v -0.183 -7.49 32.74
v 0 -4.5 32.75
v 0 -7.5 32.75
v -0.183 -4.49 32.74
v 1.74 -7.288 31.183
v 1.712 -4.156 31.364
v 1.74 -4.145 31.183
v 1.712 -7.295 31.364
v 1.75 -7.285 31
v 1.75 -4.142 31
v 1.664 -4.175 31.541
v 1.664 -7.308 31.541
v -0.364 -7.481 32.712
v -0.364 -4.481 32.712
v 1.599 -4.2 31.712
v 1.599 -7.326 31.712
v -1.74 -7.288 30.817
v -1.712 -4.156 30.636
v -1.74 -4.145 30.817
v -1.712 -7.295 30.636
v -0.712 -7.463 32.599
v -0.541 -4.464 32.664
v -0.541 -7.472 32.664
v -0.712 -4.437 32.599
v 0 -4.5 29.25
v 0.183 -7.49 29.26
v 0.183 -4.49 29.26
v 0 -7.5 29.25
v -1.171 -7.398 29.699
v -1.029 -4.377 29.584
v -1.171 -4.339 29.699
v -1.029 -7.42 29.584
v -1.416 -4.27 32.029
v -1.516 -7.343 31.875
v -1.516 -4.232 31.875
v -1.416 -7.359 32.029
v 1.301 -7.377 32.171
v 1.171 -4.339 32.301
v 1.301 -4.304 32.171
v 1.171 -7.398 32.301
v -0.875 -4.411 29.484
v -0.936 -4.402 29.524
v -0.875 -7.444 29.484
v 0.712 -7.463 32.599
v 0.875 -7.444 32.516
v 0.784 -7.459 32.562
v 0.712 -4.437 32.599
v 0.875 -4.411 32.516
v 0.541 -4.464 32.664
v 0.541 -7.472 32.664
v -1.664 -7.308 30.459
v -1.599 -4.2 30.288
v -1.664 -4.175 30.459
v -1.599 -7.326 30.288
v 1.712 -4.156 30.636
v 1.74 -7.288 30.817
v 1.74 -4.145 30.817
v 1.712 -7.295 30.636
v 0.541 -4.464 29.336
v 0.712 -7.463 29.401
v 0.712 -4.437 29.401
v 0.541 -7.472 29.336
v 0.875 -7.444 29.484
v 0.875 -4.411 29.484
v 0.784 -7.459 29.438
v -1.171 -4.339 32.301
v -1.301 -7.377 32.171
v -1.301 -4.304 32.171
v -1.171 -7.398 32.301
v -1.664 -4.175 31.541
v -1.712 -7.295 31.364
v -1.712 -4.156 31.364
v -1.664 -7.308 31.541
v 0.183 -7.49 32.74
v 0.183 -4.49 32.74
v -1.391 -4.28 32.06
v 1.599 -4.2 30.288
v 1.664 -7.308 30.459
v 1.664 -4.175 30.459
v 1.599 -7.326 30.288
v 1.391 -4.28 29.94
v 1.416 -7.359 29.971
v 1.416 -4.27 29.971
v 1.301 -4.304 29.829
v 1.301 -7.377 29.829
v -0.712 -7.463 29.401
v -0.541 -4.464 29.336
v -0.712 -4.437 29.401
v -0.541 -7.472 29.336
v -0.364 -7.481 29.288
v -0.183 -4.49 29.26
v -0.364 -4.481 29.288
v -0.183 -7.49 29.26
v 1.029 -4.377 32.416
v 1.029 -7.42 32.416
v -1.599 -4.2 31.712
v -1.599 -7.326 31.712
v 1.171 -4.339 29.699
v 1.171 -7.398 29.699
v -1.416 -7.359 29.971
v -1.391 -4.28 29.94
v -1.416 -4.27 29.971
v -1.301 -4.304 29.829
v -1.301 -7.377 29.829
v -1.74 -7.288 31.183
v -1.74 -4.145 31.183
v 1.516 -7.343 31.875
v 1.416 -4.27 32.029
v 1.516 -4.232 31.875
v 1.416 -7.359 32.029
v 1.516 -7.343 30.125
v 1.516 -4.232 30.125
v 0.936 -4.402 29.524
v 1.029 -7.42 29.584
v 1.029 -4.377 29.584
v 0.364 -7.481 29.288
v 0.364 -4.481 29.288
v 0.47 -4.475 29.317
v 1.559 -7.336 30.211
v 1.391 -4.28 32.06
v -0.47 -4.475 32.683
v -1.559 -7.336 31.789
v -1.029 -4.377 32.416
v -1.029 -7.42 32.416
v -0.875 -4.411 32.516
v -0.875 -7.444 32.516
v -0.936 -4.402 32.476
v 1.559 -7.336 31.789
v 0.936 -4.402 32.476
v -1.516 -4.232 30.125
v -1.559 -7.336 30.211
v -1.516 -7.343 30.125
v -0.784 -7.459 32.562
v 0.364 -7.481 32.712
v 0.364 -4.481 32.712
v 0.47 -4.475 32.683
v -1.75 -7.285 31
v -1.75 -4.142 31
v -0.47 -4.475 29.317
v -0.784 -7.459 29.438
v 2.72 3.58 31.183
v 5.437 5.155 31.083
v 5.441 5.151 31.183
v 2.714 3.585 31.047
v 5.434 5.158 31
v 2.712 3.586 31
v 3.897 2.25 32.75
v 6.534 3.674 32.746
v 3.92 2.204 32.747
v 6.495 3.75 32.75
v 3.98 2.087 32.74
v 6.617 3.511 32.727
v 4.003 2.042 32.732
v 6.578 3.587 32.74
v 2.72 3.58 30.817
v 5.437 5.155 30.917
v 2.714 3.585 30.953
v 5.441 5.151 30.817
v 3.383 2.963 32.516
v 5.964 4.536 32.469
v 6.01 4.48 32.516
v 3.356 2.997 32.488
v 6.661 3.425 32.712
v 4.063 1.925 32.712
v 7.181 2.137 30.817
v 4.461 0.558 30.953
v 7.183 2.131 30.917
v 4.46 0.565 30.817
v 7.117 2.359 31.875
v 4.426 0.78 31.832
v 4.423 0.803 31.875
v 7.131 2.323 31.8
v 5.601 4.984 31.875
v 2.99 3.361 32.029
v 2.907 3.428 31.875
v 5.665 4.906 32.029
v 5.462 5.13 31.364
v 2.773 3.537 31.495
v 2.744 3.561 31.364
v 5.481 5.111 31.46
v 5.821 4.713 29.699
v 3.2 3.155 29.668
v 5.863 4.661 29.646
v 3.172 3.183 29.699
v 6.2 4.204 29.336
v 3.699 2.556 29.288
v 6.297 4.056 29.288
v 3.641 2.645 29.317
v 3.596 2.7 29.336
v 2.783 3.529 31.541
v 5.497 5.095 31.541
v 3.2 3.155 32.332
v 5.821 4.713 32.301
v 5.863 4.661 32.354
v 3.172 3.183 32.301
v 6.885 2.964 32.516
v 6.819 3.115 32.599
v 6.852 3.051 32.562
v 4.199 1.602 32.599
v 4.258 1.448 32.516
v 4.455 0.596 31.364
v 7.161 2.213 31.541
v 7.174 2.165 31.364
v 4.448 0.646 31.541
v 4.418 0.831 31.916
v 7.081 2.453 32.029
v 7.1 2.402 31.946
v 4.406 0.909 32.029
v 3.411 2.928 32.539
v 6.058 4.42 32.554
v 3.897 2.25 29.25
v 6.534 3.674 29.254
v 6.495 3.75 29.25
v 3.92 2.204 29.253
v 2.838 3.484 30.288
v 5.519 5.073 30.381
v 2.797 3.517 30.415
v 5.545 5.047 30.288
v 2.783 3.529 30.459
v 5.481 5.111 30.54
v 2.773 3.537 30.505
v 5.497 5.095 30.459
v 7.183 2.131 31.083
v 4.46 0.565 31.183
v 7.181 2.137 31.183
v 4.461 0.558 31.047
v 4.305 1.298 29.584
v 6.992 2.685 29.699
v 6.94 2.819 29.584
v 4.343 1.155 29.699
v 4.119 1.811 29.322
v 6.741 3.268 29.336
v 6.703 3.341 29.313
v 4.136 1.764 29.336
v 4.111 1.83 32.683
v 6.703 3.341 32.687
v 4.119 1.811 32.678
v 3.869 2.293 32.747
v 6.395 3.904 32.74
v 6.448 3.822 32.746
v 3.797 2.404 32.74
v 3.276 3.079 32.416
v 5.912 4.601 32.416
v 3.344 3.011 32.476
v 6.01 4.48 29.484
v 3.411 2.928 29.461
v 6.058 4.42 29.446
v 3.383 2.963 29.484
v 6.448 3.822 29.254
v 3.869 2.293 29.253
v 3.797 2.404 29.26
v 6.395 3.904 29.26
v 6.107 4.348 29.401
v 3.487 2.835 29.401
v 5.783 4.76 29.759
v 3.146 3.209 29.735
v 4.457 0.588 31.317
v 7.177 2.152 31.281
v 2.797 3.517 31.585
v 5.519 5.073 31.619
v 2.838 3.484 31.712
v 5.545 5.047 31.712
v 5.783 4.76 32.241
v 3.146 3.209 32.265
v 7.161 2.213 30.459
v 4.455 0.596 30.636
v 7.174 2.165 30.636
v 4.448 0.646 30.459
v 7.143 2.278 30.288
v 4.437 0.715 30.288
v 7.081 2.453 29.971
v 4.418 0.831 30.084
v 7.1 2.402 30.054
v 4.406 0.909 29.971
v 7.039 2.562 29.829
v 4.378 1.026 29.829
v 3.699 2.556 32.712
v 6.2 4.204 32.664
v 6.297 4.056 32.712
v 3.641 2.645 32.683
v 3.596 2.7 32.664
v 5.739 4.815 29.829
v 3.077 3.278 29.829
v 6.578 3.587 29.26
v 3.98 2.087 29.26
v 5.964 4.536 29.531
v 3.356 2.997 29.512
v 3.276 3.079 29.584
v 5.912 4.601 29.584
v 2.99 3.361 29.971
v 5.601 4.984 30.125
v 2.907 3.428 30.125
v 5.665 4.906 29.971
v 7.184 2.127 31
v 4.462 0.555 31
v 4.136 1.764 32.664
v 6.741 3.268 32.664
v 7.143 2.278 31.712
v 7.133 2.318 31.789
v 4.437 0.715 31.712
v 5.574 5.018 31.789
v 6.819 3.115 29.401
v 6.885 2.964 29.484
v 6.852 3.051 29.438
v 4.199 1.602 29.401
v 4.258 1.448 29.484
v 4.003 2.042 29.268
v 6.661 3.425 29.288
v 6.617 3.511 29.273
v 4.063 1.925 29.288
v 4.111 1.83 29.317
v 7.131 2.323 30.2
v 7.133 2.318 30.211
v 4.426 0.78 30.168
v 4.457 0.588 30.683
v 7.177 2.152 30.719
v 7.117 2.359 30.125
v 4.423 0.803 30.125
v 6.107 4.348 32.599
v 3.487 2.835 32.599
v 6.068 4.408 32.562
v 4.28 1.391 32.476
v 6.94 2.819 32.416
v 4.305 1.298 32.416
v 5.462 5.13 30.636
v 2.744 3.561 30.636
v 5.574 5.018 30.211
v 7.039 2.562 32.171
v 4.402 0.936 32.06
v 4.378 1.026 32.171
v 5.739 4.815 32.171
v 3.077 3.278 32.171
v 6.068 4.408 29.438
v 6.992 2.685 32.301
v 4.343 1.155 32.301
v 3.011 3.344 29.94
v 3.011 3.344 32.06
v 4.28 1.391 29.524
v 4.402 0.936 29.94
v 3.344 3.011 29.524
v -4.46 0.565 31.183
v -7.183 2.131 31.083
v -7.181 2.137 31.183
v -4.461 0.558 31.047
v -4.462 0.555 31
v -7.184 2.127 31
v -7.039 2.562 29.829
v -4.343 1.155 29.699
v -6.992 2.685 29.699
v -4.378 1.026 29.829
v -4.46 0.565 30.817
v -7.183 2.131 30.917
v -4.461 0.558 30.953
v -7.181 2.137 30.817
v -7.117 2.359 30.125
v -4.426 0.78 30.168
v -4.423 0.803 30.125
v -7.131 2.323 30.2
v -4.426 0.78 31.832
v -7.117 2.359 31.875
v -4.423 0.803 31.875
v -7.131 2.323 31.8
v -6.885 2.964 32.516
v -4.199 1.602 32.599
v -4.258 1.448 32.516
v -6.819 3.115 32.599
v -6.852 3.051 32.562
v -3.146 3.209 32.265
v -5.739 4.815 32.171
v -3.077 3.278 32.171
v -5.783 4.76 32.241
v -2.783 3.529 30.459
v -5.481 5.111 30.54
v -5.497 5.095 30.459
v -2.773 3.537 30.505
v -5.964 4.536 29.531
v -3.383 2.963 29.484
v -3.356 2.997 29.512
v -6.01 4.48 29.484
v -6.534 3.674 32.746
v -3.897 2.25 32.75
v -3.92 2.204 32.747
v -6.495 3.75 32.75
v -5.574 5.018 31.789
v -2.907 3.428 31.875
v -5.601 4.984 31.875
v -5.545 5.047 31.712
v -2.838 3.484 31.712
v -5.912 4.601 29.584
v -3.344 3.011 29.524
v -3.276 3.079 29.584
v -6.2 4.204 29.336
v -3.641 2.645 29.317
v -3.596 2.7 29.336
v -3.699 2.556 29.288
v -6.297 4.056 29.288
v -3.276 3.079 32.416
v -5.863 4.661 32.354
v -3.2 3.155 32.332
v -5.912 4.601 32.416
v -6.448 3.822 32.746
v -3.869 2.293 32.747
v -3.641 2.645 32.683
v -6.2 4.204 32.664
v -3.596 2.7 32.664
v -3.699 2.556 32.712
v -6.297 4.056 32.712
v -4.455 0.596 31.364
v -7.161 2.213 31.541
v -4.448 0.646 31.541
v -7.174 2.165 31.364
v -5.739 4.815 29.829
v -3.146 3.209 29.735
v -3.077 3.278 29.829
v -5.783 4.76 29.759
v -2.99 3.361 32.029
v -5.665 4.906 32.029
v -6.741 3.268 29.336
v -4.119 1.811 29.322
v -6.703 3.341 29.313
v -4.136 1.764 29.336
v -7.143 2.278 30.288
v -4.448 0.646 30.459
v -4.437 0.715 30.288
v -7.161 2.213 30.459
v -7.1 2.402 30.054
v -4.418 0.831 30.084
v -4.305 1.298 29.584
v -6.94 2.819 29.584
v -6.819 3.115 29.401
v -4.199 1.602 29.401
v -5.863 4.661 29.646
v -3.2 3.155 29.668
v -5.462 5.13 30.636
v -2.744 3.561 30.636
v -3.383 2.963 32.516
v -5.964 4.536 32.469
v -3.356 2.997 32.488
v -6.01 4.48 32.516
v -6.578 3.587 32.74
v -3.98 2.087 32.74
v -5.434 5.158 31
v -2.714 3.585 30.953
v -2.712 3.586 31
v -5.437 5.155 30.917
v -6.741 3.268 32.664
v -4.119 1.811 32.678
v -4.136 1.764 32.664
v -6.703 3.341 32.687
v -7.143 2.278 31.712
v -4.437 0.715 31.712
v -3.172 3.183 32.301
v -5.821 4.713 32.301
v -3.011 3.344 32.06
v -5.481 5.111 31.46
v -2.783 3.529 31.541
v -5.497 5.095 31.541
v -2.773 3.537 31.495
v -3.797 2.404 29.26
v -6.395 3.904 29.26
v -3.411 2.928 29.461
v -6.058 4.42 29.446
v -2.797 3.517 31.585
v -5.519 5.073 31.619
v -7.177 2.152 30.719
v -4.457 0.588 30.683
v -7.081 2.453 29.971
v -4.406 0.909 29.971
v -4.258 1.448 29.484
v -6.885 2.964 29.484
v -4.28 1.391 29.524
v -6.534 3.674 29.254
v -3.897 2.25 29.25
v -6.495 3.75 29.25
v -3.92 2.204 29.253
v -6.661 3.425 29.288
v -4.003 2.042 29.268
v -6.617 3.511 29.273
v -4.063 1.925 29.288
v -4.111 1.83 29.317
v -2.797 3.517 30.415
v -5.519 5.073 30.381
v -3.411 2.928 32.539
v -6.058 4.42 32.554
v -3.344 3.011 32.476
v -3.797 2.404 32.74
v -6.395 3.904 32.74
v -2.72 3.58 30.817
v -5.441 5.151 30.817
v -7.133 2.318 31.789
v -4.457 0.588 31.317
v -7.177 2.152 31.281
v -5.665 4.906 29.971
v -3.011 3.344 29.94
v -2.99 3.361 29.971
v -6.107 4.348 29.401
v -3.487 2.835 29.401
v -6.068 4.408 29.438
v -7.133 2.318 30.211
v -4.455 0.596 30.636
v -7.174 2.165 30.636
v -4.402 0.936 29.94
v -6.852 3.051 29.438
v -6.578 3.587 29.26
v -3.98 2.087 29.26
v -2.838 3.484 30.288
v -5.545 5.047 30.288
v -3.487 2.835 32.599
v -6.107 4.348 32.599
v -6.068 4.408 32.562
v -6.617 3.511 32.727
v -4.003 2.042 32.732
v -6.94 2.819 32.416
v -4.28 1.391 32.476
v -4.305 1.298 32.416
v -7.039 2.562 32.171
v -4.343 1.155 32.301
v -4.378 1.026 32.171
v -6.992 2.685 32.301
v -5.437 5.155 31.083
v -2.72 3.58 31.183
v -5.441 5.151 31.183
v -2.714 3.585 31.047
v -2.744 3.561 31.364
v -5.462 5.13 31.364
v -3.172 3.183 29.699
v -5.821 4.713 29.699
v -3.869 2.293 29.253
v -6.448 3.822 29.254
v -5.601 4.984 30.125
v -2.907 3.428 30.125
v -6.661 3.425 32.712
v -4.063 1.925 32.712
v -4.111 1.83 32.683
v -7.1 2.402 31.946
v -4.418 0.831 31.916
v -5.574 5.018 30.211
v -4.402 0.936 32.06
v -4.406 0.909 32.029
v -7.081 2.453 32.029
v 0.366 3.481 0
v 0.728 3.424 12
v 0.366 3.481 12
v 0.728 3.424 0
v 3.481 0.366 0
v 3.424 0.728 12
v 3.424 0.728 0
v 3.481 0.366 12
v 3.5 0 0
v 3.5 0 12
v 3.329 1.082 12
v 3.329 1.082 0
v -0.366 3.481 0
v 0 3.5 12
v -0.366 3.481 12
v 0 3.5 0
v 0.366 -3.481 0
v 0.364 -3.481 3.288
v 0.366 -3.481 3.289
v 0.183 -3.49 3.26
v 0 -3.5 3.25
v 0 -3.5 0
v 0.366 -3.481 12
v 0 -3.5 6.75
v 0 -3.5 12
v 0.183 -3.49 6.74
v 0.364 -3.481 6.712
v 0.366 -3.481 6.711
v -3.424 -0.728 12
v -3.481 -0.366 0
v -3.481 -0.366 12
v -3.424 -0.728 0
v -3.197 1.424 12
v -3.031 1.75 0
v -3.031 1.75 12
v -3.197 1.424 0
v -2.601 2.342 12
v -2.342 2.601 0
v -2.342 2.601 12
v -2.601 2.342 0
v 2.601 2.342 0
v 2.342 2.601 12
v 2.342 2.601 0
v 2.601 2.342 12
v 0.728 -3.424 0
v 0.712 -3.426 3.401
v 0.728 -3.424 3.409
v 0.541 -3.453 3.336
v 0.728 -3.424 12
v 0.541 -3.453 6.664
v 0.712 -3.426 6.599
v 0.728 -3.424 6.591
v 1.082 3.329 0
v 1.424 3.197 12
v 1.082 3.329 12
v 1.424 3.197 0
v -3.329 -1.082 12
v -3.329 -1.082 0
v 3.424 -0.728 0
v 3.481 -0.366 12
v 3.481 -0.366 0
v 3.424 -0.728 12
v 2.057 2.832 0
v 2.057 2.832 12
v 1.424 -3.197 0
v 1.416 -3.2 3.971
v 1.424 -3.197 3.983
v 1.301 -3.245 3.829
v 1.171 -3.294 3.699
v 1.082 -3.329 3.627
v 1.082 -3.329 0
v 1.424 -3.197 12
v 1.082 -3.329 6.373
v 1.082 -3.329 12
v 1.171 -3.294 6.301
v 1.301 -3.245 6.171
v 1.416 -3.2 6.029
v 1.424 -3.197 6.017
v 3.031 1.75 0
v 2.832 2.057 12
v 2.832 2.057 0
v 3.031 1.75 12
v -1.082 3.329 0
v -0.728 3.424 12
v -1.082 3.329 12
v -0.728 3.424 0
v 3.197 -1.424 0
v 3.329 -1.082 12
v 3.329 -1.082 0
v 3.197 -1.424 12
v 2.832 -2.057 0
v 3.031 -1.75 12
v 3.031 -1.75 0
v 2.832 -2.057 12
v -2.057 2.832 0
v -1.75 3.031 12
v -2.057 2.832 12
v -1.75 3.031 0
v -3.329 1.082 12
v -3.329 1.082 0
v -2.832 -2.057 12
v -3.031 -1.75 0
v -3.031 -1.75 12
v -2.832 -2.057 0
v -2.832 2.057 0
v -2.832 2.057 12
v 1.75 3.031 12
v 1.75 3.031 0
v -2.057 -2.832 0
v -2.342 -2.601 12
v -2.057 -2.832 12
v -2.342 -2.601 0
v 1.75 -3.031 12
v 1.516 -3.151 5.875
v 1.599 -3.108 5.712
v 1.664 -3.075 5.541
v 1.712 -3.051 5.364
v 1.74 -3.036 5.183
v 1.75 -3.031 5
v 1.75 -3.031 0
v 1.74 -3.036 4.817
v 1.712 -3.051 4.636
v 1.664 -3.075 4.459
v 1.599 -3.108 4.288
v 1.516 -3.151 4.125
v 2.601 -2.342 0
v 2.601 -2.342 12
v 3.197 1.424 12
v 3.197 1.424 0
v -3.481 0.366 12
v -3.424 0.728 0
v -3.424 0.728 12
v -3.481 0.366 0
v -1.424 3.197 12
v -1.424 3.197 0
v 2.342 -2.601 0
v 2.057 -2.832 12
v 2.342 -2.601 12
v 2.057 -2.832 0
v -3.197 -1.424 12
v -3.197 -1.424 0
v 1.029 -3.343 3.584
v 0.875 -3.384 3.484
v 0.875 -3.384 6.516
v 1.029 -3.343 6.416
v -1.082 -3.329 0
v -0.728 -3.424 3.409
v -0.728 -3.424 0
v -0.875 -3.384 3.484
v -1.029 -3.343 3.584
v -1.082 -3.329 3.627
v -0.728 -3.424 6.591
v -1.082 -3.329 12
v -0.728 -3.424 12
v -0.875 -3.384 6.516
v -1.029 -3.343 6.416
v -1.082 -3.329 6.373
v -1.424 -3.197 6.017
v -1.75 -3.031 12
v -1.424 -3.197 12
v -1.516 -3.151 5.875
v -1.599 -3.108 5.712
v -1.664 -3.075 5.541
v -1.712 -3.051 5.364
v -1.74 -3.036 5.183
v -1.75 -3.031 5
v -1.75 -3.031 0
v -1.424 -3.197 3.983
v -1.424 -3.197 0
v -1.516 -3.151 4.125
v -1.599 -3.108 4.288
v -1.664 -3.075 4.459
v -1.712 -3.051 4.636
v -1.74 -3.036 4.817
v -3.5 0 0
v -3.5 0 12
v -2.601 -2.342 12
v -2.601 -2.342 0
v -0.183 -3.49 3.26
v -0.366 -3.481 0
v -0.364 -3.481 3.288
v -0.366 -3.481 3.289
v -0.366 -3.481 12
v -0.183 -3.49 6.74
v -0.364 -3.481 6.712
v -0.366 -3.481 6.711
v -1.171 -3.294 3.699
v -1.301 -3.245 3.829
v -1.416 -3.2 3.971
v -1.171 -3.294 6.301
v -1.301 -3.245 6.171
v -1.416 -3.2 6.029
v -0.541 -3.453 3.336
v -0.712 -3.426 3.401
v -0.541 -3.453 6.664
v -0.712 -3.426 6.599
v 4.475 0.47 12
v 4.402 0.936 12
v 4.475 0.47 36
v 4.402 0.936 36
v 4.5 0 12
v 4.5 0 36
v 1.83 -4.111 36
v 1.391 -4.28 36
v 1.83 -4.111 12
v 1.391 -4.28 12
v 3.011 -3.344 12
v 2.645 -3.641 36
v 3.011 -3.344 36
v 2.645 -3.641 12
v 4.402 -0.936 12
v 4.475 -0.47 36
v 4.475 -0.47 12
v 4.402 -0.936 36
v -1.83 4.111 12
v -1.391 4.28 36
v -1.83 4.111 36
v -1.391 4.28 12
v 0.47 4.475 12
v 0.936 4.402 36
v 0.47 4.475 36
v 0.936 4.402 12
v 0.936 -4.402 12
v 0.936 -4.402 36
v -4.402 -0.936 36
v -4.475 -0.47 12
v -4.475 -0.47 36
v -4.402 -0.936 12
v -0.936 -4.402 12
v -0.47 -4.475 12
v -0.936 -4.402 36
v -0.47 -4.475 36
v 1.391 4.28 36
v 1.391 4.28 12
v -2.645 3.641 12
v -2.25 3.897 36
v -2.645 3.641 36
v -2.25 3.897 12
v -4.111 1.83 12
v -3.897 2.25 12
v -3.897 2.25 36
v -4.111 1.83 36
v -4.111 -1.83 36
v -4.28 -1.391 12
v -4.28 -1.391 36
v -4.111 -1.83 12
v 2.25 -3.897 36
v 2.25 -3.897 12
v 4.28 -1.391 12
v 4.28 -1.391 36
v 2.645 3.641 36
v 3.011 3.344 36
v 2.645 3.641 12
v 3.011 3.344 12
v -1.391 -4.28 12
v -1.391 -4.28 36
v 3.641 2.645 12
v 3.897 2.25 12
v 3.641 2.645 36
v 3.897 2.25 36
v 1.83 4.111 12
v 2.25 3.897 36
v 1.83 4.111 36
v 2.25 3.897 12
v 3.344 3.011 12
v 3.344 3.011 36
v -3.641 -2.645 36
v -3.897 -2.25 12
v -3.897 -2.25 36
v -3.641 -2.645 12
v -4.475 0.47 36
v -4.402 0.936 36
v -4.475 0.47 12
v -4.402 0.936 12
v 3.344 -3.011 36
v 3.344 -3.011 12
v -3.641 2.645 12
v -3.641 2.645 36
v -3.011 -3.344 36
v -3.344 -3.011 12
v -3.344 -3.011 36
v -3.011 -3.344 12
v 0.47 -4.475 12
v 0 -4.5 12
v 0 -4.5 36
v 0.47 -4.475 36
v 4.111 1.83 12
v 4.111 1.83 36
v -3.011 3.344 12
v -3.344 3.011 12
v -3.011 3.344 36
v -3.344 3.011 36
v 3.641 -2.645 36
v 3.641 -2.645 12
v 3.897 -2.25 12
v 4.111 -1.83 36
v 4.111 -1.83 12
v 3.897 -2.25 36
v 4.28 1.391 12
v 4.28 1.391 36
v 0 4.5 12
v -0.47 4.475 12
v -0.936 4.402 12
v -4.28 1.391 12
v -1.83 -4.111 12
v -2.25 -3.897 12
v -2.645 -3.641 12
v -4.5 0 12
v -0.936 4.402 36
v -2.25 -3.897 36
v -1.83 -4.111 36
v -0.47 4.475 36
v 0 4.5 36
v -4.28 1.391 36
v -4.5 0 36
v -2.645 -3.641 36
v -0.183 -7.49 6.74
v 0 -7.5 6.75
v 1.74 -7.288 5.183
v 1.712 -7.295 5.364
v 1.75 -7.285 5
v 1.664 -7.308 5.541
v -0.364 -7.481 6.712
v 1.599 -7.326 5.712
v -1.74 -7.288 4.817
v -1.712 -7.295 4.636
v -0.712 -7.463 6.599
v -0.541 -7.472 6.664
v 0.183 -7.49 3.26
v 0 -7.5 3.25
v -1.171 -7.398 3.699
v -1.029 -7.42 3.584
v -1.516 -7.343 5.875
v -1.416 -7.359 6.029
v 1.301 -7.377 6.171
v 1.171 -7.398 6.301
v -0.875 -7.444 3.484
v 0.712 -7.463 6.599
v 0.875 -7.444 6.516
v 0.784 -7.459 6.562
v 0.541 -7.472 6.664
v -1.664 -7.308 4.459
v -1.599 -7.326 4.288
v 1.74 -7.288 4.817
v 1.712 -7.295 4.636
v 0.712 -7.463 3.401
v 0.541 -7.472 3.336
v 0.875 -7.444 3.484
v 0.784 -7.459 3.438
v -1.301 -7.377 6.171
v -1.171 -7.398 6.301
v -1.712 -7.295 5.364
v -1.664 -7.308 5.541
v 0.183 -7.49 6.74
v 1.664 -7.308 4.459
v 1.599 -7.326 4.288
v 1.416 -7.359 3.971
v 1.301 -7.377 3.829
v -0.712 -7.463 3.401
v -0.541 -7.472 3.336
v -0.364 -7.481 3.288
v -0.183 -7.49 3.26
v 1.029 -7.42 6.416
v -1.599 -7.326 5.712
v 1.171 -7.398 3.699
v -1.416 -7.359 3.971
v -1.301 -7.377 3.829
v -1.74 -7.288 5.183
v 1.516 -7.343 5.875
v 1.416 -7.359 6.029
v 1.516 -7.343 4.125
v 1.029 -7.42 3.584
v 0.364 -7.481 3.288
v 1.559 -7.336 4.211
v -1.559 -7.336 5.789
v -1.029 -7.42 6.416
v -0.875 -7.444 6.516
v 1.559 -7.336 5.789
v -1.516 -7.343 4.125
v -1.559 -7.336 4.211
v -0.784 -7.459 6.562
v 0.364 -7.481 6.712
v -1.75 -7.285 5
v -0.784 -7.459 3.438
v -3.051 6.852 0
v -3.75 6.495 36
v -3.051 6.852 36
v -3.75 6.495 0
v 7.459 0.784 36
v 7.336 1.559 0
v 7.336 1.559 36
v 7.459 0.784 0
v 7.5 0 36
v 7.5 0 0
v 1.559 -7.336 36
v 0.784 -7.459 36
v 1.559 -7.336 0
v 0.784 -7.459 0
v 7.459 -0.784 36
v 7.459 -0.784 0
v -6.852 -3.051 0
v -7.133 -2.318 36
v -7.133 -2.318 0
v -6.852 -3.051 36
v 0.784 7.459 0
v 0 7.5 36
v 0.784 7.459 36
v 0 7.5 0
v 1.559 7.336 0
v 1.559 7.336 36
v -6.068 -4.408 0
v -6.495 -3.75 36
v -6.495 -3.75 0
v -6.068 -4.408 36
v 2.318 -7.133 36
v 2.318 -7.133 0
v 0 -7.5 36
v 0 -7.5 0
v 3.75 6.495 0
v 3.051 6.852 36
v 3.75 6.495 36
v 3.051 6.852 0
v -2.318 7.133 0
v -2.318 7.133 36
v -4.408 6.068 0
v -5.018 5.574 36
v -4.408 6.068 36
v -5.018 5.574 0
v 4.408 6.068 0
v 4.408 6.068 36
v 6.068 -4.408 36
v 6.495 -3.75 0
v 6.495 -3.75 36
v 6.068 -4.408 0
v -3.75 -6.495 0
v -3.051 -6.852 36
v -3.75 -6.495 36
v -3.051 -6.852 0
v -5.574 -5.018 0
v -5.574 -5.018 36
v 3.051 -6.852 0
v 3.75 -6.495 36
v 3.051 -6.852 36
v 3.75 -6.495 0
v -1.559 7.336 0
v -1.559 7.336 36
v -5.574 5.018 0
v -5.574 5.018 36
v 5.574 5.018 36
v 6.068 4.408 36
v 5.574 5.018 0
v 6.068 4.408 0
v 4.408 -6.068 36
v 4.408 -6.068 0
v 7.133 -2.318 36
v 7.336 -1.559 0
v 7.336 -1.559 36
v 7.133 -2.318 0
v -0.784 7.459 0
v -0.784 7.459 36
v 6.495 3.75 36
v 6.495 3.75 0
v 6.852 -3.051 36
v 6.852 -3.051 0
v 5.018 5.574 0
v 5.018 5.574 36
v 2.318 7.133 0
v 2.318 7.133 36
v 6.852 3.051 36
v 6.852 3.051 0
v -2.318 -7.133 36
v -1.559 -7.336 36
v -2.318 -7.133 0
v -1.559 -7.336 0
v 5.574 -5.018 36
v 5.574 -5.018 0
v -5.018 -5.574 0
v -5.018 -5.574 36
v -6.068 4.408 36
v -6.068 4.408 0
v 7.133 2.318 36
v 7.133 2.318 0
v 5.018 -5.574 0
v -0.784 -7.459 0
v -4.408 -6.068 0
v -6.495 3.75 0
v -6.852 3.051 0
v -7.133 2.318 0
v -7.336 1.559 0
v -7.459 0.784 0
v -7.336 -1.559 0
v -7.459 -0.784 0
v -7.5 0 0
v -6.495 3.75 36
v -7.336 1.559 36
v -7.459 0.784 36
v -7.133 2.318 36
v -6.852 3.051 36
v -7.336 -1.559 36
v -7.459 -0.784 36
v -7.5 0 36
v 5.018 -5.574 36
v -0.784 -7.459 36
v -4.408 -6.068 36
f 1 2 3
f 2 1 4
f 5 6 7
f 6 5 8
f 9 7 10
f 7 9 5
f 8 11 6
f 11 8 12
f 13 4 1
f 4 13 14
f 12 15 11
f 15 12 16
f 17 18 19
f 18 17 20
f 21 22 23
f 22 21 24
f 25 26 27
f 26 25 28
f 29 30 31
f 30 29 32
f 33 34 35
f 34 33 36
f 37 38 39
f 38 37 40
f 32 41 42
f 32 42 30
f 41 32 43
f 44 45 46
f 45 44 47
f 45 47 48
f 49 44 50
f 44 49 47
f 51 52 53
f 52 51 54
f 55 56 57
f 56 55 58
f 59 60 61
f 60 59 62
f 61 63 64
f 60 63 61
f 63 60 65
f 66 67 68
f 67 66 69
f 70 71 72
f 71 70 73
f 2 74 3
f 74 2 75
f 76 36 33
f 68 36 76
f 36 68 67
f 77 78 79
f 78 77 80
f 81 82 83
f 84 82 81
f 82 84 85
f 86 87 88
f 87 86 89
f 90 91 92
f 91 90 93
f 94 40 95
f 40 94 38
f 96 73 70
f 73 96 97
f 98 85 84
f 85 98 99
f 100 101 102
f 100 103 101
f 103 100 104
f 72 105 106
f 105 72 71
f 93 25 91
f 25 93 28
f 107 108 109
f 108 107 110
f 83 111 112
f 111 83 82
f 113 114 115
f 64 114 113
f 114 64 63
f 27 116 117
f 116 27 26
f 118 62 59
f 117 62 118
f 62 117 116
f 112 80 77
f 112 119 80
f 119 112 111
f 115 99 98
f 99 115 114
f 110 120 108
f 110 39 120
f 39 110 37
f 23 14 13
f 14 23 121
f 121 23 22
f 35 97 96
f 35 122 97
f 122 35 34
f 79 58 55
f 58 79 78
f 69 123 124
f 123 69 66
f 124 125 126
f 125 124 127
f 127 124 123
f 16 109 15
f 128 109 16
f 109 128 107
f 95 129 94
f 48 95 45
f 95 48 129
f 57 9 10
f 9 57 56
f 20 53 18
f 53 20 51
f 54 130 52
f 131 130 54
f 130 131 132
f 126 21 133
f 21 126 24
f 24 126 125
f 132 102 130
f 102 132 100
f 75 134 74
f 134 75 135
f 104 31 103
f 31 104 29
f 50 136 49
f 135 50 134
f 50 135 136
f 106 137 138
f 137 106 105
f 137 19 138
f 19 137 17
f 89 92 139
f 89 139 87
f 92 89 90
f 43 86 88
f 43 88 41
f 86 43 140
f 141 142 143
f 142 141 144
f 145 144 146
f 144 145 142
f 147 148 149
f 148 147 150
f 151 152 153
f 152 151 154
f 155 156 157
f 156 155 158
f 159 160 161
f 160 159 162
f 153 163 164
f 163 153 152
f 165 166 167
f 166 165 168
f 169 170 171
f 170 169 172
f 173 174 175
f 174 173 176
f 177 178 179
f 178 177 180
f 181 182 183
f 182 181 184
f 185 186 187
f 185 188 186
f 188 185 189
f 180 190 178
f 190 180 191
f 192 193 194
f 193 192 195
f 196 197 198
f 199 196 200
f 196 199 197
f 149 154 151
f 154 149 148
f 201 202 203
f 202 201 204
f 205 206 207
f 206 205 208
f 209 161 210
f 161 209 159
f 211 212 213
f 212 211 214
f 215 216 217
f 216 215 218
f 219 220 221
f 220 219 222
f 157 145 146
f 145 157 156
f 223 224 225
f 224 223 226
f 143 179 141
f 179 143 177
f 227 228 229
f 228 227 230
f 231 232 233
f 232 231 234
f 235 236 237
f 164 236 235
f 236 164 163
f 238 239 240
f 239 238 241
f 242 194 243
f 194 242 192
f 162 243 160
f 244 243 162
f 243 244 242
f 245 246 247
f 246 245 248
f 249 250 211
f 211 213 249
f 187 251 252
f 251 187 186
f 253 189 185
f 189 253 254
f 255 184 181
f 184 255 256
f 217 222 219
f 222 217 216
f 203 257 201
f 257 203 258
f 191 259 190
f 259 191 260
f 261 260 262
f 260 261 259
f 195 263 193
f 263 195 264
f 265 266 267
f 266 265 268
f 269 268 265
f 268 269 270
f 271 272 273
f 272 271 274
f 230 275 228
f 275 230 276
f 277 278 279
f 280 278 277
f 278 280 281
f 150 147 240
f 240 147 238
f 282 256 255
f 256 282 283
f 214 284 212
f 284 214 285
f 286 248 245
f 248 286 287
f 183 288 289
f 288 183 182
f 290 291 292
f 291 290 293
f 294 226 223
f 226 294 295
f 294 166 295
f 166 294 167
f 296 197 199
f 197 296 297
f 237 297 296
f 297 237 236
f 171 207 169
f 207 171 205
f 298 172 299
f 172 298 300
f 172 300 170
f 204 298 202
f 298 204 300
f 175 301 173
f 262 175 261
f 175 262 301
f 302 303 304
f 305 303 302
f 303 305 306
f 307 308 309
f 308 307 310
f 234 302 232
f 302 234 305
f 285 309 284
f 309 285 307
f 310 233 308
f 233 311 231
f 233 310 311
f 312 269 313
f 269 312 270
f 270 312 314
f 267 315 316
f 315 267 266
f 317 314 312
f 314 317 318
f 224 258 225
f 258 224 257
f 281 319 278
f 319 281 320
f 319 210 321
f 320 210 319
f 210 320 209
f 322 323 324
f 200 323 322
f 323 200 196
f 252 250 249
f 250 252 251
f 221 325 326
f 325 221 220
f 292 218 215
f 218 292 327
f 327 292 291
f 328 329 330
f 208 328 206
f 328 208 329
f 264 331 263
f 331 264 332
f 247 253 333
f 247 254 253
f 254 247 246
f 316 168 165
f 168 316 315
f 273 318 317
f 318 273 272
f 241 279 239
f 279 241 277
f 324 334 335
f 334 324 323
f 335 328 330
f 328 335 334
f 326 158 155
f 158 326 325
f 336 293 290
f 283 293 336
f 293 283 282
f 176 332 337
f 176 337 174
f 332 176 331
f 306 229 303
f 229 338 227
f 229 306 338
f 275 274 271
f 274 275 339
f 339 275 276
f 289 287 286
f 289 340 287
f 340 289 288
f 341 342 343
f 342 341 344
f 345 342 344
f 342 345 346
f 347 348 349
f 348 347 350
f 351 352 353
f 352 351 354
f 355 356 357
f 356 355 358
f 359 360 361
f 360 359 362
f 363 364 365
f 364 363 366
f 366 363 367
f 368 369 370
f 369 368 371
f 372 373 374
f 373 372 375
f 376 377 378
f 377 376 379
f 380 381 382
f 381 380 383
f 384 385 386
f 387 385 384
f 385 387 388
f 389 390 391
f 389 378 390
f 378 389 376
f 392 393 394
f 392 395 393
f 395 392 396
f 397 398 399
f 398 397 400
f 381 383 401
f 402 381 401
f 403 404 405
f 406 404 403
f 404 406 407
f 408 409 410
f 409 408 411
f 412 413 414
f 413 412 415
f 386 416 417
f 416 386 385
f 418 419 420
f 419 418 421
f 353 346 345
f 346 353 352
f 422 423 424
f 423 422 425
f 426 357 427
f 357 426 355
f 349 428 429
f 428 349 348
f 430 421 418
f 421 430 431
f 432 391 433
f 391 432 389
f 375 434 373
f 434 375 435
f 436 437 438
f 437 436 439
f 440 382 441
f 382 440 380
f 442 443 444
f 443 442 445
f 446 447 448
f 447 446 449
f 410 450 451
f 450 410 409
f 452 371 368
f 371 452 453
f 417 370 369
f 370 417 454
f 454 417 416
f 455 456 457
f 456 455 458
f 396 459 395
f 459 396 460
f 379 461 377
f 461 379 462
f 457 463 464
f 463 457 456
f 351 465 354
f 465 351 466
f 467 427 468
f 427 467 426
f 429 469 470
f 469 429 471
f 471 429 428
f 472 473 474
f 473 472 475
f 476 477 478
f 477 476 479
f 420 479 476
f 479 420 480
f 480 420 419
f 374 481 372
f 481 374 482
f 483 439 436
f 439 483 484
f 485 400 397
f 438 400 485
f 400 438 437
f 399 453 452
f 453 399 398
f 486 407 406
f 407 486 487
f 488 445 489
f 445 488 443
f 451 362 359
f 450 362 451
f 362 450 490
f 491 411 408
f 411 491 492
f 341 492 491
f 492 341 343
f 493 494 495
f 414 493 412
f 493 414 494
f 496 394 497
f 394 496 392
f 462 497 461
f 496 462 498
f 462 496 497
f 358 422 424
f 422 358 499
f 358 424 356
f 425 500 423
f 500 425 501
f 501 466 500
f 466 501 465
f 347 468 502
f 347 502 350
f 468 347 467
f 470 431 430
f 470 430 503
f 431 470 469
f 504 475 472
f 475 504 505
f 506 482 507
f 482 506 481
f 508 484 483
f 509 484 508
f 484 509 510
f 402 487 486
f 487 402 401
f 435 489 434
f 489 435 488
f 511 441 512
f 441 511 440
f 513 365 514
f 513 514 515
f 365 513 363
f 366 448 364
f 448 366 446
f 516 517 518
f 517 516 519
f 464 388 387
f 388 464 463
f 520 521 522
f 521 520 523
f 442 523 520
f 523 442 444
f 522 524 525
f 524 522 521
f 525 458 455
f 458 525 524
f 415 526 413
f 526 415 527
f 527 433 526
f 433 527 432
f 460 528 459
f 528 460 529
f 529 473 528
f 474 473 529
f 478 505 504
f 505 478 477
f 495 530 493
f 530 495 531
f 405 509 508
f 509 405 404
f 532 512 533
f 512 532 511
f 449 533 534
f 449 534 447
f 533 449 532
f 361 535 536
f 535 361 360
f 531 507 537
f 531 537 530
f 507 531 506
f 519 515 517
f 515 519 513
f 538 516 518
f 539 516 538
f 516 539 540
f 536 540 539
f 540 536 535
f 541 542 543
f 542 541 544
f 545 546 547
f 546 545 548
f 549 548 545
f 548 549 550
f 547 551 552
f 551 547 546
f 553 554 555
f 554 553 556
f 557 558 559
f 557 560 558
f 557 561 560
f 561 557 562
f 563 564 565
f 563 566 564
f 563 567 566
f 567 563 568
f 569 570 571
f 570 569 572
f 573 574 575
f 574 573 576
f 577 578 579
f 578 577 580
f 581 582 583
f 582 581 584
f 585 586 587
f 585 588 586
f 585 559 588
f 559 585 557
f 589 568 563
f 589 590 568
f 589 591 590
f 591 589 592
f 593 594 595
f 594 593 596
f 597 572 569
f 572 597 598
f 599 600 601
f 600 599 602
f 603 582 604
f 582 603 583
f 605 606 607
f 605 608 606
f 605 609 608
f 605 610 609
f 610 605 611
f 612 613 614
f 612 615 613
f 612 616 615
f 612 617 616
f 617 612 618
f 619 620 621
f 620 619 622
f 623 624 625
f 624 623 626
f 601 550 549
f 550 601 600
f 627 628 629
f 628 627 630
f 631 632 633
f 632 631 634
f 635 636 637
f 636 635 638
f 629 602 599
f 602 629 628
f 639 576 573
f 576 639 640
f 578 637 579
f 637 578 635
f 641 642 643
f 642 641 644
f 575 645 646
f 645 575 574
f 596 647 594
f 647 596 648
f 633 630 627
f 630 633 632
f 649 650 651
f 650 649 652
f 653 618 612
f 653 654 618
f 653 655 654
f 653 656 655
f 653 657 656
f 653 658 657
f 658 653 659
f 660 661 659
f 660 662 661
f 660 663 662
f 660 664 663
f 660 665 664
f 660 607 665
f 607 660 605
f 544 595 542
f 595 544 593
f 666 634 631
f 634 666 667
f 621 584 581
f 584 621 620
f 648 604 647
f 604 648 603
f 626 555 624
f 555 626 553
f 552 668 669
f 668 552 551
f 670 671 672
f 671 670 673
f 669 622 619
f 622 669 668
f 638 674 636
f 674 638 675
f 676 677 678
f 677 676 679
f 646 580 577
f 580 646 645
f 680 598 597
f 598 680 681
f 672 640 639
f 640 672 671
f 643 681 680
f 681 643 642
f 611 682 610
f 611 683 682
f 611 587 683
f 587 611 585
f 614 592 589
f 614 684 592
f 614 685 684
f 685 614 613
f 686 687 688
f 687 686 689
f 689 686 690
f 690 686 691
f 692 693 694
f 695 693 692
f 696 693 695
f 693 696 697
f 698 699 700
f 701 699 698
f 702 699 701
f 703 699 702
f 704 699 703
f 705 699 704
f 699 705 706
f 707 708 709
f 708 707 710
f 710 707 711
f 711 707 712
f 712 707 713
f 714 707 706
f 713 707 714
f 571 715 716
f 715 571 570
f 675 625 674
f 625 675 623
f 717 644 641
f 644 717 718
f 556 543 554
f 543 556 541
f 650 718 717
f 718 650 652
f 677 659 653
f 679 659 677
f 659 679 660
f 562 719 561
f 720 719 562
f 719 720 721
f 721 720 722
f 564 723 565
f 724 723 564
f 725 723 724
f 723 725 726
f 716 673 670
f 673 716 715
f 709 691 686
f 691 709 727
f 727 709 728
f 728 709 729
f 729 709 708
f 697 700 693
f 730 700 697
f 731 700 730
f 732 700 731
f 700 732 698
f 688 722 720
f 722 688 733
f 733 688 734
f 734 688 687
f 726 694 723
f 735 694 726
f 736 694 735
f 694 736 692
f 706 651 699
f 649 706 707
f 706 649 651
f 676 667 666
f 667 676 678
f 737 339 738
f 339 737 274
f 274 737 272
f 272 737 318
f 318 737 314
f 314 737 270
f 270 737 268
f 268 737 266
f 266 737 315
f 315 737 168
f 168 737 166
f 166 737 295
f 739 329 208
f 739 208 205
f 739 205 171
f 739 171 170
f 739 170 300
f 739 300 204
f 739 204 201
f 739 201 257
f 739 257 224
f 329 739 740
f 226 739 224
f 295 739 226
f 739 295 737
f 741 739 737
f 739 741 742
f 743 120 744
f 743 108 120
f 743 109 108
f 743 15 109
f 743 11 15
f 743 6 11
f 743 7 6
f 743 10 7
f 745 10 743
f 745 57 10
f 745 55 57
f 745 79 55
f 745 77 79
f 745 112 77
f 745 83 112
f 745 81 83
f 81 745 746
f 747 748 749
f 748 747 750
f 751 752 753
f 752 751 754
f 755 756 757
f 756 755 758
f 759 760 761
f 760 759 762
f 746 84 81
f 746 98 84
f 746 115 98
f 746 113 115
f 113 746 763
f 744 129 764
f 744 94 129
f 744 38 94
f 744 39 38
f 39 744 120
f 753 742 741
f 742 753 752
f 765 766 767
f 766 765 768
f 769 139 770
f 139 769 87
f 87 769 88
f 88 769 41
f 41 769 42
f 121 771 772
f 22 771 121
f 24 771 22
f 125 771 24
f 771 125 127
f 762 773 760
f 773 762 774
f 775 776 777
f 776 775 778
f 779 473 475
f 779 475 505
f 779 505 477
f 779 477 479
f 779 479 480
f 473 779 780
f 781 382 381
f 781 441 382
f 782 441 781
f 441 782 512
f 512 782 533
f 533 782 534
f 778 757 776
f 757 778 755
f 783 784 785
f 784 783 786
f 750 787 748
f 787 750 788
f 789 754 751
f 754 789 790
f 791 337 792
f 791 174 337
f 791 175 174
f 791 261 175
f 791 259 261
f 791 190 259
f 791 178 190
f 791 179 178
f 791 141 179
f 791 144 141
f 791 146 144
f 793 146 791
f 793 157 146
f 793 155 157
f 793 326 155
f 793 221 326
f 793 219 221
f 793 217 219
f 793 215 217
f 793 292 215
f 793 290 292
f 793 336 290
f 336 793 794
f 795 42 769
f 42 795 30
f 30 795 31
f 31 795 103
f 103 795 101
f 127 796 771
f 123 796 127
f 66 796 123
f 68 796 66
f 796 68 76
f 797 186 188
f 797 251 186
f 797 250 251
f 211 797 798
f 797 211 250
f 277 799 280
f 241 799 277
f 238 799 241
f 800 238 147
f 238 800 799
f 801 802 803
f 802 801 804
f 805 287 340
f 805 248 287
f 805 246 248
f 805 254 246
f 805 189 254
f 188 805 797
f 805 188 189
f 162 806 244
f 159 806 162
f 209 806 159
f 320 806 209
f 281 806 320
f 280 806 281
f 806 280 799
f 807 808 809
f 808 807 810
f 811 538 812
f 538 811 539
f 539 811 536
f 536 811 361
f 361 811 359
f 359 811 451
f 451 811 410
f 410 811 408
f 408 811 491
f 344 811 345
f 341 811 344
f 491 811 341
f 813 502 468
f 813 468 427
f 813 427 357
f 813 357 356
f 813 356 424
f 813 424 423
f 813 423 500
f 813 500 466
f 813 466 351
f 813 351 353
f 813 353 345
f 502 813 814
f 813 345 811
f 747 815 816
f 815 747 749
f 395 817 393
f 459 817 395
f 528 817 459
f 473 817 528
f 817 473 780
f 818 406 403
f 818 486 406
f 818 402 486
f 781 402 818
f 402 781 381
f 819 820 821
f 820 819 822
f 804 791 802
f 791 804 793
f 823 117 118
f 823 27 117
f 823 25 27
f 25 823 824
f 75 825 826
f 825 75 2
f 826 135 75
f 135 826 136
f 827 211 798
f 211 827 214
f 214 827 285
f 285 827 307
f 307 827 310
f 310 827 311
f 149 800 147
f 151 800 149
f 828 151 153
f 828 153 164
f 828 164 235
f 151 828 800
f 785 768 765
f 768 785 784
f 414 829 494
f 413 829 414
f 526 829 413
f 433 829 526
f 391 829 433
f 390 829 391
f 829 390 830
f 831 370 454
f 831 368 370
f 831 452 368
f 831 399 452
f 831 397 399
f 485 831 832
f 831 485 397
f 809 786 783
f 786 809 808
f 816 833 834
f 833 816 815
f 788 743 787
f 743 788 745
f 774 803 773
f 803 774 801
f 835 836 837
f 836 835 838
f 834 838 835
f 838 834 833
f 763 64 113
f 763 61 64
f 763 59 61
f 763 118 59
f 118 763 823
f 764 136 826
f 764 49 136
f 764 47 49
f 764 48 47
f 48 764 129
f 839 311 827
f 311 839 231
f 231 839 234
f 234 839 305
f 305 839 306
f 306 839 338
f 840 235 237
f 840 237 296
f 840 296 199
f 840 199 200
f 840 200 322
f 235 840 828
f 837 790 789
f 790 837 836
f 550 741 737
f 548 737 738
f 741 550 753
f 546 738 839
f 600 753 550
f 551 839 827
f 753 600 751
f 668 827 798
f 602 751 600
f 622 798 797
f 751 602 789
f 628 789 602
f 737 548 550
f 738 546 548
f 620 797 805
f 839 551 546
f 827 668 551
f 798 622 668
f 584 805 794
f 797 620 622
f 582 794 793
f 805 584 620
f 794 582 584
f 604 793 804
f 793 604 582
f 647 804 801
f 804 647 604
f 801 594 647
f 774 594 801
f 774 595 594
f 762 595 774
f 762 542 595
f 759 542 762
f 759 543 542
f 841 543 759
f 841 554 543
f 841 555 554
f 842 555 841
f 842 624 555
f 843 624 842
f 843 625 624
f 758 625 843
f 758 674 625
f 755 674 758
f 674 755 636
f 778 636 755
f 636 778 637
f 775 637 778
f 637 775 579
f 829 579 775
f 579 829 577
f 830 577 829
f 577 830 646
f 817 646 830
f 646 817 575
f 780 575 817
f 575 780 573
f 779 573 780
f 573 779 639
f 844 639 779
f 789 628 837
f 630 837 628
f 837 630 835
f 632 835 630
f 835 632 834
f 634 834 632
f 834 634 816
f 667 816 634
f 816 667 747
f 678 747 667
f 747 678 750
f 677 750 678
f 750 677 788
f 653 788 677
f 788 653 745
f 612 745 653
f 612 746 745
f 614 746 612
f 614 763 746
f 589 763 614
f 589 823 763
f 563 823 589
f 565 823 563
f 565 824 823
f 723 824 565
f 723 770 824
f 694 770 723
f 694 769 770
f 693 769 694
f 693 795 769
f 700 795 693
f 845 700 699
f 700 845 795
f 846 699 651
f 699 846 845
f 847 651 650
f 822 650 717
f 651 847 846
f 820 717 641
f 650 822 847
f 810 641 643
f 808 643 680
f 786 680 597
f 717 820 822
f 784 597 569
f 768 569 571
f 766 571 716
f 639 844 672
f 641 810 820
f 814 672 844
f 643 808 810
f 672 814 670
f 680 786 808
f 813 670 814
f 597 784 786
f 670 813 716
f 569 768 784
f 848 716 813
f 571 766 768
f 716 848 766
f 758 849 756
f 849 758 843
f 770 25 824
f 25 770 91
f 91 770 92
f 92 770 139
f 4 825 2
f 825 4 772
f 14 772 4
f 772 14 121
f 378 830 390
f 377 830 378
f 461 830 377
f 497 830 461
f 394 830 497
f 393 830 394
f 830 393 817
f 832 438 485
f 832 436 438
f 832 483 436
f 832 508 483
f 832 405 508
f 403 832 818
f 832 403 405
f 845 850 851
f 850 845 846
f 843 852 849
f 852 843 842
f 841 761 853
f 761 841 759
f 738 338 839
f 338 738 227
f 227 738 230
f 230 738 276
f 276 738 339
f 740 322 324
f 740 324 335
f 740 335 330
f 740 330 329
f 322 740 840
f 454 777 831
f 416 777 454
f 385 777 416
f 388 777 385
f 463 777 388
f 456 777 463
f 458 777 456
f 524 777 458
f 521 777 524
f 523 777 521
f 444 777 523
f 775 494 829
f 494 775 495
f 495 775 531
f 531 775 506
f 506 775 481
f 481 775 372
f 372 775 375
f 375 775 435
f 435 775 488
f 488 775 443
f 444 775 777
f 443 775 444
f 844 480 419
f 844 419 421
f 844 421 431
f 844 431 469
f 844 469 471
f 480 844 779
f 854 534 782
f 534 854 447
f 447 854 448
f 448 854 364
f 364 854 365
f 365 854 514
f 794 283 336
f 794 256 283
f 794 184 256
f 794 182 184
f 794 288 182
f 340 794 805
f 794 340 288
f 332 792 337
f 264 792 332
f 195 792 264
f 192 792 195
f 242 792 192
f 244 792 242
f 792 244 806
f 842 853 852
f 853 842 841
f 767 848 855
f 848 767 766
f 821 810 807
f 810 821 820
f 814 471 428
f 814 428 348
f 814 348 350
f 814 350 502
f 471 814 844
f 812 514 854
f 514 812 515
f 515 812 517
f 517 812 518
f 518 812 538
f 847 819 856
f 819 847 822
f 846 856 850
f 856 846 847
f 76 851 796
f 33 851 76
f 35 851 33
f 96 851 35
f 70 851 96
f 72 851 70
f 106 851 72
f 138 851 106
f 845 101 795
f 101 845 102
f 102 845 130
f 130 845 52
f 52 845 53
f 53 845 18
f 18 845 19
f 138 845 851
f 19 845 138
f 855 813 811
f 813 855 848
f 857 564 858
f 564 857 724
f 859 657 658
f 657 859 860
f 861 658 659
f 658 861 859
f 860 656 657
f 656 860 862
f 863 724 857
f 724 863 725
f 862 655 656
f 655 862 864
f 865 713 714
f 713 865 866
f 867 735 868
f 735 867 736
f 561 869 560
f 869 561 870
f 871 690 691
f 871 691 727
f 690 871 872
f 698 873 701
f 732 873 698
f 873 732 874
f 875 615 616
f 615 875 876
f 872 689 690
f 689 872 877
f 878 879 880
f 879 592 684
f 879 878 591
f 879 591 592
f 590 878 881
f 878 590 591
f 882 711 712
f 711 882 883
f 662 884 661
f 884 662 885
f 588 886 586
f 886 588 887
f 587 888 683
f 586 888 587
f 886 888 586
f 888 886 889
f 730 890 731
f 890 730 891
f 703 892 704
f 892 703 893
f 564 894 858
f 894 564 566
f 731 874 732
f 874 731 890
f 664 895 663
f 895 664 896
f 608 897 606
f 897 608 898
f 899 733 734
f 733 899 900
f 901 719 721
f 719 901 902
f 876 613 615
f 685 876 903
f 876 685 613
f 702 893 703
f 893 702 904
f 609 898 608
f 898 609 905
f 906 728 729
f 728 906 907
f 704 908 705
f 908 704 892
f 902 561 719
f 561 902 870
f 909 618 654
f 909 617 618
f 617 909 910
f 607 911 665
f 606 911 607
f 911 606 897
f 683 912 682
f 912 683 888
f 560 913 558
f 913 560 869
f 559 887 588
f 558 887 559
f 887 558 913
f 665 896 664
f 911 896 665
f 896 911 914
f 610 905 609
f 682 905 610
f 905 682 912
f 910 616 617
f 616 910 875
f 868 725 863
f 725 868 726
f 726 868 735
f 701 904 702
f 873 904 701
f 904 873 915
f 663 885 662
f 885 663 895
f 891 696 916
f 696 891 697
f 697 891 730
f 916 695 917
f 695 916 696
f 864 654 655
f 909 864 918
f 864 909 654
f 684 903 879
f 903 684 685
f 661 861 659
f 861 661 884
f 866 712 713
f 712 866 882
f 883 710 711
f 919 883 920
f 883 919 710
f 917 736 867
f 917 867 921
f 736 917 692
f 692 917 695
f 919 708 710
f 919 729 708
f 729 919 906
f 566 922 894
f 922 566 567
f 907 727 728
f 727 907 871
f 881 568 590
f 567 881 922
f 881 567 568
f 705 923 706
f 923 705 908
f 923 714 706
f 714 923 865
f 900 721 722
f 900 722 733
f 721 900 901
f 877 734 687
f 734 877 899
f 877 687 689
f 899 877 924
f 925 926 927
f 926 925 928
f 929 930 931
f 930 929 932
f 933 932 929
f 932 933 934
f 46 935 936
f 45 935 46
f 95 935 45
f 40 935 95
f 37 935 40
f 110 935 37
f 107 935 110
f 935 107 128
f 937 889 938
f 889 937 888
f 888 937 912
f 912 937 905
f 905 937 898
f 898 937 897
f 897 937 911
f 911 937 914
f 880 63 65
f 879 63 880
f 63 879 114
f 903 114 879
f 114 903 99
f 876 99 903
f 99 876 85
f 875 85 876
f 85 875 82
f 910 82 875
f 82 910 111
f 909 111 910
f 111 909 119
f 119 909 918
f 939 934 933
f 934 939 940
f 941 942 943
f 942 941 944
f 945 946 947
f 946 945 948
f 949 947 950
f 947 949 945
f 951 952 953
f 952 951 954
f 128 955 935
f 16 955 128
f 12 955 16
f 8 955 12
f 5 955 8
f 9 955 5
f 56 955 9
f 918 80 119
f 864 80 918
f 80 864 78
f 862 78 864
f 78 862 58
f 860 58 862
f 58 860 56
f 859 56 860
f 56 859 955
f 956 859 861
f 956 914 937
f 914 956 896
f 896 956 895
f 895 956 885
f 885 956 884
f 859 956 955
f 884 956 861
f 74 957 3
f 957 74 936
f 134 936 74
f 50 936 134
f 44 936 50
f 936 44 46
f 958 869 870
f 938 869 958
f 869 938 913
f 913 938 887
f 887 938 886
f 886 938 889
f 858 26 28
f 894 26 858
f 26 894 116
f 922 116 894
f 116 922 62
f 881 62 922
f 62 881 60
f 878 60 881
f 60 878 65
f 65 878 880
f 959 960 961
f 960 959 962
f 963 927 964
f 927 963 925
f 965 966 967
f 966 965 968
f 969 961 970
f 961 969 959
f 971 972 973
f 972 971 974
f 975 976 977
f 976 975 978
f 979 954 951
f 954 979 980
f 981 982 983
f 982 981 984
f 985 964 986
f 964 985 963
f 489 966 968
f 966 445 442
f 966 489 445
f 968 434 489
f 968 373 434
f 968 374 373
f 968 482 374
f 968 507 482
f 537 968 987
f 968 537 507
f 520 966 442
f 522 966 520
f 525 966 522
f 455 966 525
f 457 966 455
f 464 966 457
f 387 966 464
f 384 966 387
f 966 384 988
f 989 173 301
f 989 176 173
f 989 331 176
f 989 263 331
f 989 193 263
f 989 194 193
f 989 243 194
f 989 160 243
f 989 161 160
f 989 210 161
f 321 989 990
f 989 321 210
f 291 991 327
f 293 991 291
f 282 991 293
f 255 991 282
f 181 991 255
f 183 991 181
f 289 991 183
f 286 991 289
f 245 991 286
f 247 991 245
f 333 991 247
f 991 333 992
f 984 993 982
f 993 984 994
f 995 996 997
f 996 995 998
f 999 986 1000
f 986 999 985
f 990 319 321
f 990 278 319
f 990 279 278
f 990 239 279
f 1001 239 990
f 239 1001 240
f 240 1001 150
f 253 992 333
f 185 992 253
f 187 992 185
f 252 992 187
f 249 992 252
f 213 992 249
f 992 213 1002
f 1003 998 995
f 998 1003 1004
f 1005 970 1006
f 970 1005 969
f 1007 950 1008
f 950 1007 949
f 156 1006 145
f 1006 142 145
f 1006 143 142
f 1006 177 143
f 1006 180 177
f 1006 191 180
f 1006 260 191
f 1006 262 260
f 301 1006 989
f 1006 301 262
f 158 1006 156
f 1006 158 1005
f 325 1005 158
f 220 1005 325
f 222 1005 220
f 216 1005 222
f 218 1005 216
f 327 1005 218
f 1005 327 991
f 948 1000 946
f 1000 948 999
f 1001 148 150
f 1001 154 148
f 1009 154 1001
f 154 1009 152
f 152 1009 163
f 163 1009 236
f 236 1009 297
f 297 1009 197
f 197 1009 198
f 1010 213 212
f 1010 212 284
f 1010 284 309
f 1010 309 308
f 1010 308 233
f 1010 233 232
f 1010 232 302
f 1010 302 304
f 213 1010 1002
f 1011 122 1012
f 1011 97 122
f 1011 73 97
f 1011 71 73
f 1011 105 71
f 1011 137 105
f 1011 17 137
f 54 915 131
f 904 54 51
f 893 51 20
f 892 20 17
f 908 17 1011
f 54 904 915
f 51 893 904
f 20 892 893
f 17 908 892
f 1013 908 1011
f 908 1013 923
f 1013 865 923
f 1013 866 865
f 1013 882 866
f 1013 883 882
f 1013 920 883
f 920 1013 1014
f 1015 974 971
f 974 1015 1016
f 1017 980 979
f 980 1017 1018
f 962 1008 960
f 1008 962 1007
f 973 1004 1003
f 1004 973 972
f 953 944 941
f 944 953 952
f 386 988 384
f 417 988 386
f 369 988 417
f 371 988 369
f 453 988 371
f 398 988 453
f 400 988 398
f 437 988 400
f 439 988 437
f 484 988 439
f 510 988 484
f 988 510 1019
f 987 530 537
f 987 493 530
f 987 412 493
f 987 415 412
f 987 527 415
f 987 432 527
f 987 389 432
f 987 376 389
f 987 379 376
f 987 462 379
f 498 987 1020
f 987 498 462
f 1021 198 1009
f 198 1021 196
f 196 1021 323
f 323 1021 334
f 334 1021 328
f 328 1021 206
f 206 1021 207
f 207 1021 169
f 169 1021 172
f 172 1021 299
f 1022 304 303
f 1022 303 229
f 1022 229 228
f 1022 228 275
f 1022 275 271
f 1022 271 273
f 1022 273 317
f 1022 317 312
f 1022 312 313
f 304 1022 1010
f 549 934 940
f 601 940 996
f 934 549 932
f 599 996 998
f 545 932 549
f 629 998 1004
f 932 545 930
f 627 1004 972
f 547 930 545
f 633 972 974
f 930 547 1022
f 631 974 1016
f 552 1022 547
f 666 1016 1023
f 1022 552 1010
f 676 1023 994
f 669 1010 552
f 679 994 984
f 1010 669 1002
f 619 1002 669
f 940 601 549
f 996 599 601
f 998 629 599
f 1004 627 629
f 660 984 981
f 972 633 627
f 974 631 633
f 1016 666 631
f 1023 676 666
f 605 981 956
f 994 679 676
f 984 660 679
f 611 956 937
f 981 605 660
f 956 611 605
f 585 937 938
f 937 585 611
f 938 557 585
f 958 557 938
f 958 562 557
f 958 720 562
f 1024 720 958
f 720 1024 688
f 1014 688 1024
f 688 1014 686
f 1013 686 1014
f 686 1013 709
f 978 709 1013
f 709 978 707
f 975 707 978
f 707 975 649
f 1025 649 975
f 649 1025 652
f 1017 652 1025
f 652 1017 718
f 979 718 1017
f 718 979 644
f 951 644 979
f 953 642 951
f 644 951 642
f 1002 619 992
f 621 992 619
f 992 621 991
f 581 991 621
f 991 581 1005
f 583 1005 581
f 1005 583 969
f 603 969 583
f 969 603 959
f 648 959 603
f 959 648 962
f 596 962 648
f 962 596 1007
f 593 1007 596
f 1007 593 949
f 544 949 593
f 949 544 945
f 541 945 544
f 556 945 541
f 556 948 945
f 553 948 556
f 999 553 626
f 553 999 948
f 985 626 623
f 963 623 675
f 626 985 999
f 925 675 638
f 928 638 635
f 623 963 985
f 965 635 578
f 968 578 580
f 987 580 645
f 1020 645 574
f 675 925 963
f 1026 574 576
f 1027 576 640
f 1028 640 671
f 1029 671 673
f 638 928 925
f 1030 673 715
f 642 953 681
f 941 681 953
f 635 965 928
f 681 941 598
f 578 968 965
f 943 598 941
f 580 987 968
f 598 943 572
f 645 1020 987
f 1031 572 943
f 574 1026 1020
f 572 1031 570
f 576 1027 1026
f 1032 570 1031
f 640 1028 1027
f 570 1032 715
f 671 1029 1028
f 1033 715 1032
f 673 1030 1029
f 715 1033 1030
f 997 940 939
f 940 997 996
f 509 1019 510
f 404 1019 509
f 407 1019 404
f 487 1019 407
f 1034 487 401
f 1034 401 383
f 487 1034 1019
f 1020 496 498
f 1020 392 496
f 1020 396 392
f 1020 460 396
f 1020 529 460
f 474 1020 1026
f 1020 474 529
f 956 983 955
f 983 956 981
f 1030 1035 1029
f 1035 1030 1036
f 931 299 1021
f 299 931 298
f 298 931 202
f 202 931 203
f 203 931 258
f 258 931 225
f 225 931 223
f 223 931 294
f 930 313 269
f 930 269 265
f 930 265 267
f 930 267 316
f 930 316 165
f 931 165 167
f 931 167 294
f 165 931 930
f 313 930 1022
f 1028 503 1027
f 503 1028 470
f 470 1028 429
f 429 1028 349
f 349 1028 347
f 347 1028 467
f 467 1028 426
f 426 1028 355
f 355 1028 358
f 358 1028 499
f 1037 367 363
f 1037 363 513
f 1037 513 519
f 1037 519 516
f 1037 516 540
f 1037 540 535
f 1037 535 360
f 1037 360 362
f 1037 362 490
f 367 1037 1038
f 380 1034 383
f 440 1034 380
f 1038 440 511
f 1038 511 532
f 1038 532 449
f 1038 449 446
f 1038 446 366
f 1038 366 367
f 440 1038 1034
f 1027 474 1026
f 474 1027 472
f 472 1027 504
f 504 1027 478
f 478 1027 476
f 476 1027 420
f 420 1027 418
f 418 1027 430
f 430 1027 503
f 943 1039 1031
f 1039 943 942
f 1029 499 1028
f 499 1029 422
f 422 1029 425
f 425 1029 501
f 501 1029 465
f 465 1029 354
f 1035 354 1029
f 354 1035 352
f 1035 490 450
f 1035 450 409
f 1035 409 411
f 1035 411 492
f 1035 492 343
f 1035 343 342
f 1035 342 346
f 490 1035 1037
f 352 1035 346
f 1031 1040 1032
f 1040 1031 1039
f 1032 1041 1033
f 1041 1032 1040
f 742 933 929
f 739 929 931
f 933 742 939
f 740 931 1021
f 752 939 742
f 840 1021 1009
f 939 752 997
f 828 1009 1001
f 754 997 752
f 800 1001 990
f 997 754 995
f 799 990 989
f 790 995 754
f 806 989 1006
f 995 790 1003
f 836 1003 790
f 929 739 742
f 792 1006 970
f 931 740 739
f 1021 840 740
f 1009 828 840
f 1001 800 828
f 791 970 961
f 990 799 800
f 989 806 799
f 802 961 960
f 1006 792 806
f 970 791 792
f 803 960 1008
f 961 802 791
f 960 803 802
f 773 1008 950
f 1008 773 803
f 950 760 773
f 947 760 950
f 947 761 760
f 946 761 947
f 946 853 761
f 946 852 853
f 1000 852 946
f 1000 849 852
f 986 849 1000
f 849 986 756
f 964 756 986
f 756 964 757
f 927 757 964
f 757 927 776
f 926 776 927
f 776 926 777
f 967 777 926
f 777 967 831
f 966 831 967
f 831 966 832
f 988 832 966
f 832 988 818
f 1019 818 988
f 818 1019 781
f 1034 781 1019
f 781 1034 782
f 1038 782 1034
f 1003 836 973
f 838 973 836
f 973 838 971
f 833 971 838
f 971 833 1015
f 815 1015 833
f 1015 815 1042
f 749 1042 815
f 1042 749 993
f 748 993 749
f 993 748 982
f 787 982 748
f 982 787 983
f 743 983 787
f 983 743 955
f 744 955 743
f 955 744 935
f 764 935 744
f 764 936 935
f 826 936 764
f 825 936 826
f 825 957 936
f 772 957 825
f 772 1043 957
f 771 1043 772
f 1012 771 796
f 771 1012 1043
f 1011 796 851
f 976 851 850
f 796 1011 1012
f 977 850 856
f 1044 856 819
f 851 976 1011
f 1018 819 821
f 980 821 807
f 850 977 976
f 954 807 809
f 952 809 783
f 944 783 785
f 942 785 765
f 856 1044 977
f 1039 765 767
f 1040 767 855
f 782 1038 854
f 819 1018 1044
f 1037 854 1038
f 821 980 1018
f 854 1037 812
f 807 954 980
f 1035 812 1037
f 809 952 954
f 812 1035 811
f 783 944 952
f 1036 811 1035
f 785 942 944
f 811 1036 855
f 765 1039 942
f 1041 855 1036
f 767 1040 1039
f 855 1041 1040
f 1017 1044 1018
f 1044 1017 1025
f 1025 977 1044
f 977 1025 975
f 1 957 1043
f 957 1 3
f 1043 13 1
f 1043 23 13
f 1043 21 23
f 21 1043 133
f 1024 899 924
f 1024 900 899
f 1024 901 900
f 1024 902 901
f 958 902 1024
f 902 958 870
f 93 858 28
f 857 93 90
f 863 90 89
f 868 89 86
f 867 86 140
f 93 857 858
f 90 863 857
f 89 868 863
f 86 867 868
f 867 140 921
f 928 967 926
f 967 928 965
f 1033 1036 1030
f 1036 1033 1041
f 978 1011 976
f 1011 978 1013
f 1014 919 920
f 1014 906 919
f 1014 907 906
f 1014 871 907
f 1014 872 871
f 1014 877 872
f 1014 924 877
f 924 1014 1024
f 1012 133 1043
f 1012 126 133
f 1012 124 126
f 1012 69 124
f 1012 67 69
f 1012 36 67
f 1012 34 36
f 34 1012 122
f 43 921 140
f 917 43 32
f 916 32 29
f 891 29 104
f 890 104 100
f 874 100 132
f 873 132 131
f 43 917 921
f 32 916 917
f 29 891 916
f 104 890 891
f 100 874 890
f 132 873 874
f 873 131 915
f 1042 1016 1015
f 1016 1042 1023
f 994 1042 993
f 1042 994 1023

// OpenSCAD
linkage_height = 36;     //
dia_sm = 7;              // inner diameter
dia_lg = 9;              // 
bolt_offset = 5;
bolt_dia = 3.5;
thickness = 3;

neg_offset = 1;
$fn=60;

difference() {
    union() {
        cylinder(h=linkage_height, d=dia_lg+2*thickness);
    }
    union() {
        translate([0,0,-neg_offset])
            cylinder(h=linkage_height/3+2, d=dia_sm);
        translate([0,0,linkage_height/3])
            cylinder(h=2*linkage_height/3+1, d=dia_lg);
        
        translate([0, 0, bolt_offset]) rotate([90, 0, 0])
            cylinder(h=dia_lg+2*thickness+1, d=bolt_dia);
        for (i=[0:2])
            translate([0, 0, linkage_height-bolt_offset]) rotate([90, 0, 120*i])
                cylinder(h=dia_lg+2*thickness+1, d=bolt_dia);
        
    }
}
